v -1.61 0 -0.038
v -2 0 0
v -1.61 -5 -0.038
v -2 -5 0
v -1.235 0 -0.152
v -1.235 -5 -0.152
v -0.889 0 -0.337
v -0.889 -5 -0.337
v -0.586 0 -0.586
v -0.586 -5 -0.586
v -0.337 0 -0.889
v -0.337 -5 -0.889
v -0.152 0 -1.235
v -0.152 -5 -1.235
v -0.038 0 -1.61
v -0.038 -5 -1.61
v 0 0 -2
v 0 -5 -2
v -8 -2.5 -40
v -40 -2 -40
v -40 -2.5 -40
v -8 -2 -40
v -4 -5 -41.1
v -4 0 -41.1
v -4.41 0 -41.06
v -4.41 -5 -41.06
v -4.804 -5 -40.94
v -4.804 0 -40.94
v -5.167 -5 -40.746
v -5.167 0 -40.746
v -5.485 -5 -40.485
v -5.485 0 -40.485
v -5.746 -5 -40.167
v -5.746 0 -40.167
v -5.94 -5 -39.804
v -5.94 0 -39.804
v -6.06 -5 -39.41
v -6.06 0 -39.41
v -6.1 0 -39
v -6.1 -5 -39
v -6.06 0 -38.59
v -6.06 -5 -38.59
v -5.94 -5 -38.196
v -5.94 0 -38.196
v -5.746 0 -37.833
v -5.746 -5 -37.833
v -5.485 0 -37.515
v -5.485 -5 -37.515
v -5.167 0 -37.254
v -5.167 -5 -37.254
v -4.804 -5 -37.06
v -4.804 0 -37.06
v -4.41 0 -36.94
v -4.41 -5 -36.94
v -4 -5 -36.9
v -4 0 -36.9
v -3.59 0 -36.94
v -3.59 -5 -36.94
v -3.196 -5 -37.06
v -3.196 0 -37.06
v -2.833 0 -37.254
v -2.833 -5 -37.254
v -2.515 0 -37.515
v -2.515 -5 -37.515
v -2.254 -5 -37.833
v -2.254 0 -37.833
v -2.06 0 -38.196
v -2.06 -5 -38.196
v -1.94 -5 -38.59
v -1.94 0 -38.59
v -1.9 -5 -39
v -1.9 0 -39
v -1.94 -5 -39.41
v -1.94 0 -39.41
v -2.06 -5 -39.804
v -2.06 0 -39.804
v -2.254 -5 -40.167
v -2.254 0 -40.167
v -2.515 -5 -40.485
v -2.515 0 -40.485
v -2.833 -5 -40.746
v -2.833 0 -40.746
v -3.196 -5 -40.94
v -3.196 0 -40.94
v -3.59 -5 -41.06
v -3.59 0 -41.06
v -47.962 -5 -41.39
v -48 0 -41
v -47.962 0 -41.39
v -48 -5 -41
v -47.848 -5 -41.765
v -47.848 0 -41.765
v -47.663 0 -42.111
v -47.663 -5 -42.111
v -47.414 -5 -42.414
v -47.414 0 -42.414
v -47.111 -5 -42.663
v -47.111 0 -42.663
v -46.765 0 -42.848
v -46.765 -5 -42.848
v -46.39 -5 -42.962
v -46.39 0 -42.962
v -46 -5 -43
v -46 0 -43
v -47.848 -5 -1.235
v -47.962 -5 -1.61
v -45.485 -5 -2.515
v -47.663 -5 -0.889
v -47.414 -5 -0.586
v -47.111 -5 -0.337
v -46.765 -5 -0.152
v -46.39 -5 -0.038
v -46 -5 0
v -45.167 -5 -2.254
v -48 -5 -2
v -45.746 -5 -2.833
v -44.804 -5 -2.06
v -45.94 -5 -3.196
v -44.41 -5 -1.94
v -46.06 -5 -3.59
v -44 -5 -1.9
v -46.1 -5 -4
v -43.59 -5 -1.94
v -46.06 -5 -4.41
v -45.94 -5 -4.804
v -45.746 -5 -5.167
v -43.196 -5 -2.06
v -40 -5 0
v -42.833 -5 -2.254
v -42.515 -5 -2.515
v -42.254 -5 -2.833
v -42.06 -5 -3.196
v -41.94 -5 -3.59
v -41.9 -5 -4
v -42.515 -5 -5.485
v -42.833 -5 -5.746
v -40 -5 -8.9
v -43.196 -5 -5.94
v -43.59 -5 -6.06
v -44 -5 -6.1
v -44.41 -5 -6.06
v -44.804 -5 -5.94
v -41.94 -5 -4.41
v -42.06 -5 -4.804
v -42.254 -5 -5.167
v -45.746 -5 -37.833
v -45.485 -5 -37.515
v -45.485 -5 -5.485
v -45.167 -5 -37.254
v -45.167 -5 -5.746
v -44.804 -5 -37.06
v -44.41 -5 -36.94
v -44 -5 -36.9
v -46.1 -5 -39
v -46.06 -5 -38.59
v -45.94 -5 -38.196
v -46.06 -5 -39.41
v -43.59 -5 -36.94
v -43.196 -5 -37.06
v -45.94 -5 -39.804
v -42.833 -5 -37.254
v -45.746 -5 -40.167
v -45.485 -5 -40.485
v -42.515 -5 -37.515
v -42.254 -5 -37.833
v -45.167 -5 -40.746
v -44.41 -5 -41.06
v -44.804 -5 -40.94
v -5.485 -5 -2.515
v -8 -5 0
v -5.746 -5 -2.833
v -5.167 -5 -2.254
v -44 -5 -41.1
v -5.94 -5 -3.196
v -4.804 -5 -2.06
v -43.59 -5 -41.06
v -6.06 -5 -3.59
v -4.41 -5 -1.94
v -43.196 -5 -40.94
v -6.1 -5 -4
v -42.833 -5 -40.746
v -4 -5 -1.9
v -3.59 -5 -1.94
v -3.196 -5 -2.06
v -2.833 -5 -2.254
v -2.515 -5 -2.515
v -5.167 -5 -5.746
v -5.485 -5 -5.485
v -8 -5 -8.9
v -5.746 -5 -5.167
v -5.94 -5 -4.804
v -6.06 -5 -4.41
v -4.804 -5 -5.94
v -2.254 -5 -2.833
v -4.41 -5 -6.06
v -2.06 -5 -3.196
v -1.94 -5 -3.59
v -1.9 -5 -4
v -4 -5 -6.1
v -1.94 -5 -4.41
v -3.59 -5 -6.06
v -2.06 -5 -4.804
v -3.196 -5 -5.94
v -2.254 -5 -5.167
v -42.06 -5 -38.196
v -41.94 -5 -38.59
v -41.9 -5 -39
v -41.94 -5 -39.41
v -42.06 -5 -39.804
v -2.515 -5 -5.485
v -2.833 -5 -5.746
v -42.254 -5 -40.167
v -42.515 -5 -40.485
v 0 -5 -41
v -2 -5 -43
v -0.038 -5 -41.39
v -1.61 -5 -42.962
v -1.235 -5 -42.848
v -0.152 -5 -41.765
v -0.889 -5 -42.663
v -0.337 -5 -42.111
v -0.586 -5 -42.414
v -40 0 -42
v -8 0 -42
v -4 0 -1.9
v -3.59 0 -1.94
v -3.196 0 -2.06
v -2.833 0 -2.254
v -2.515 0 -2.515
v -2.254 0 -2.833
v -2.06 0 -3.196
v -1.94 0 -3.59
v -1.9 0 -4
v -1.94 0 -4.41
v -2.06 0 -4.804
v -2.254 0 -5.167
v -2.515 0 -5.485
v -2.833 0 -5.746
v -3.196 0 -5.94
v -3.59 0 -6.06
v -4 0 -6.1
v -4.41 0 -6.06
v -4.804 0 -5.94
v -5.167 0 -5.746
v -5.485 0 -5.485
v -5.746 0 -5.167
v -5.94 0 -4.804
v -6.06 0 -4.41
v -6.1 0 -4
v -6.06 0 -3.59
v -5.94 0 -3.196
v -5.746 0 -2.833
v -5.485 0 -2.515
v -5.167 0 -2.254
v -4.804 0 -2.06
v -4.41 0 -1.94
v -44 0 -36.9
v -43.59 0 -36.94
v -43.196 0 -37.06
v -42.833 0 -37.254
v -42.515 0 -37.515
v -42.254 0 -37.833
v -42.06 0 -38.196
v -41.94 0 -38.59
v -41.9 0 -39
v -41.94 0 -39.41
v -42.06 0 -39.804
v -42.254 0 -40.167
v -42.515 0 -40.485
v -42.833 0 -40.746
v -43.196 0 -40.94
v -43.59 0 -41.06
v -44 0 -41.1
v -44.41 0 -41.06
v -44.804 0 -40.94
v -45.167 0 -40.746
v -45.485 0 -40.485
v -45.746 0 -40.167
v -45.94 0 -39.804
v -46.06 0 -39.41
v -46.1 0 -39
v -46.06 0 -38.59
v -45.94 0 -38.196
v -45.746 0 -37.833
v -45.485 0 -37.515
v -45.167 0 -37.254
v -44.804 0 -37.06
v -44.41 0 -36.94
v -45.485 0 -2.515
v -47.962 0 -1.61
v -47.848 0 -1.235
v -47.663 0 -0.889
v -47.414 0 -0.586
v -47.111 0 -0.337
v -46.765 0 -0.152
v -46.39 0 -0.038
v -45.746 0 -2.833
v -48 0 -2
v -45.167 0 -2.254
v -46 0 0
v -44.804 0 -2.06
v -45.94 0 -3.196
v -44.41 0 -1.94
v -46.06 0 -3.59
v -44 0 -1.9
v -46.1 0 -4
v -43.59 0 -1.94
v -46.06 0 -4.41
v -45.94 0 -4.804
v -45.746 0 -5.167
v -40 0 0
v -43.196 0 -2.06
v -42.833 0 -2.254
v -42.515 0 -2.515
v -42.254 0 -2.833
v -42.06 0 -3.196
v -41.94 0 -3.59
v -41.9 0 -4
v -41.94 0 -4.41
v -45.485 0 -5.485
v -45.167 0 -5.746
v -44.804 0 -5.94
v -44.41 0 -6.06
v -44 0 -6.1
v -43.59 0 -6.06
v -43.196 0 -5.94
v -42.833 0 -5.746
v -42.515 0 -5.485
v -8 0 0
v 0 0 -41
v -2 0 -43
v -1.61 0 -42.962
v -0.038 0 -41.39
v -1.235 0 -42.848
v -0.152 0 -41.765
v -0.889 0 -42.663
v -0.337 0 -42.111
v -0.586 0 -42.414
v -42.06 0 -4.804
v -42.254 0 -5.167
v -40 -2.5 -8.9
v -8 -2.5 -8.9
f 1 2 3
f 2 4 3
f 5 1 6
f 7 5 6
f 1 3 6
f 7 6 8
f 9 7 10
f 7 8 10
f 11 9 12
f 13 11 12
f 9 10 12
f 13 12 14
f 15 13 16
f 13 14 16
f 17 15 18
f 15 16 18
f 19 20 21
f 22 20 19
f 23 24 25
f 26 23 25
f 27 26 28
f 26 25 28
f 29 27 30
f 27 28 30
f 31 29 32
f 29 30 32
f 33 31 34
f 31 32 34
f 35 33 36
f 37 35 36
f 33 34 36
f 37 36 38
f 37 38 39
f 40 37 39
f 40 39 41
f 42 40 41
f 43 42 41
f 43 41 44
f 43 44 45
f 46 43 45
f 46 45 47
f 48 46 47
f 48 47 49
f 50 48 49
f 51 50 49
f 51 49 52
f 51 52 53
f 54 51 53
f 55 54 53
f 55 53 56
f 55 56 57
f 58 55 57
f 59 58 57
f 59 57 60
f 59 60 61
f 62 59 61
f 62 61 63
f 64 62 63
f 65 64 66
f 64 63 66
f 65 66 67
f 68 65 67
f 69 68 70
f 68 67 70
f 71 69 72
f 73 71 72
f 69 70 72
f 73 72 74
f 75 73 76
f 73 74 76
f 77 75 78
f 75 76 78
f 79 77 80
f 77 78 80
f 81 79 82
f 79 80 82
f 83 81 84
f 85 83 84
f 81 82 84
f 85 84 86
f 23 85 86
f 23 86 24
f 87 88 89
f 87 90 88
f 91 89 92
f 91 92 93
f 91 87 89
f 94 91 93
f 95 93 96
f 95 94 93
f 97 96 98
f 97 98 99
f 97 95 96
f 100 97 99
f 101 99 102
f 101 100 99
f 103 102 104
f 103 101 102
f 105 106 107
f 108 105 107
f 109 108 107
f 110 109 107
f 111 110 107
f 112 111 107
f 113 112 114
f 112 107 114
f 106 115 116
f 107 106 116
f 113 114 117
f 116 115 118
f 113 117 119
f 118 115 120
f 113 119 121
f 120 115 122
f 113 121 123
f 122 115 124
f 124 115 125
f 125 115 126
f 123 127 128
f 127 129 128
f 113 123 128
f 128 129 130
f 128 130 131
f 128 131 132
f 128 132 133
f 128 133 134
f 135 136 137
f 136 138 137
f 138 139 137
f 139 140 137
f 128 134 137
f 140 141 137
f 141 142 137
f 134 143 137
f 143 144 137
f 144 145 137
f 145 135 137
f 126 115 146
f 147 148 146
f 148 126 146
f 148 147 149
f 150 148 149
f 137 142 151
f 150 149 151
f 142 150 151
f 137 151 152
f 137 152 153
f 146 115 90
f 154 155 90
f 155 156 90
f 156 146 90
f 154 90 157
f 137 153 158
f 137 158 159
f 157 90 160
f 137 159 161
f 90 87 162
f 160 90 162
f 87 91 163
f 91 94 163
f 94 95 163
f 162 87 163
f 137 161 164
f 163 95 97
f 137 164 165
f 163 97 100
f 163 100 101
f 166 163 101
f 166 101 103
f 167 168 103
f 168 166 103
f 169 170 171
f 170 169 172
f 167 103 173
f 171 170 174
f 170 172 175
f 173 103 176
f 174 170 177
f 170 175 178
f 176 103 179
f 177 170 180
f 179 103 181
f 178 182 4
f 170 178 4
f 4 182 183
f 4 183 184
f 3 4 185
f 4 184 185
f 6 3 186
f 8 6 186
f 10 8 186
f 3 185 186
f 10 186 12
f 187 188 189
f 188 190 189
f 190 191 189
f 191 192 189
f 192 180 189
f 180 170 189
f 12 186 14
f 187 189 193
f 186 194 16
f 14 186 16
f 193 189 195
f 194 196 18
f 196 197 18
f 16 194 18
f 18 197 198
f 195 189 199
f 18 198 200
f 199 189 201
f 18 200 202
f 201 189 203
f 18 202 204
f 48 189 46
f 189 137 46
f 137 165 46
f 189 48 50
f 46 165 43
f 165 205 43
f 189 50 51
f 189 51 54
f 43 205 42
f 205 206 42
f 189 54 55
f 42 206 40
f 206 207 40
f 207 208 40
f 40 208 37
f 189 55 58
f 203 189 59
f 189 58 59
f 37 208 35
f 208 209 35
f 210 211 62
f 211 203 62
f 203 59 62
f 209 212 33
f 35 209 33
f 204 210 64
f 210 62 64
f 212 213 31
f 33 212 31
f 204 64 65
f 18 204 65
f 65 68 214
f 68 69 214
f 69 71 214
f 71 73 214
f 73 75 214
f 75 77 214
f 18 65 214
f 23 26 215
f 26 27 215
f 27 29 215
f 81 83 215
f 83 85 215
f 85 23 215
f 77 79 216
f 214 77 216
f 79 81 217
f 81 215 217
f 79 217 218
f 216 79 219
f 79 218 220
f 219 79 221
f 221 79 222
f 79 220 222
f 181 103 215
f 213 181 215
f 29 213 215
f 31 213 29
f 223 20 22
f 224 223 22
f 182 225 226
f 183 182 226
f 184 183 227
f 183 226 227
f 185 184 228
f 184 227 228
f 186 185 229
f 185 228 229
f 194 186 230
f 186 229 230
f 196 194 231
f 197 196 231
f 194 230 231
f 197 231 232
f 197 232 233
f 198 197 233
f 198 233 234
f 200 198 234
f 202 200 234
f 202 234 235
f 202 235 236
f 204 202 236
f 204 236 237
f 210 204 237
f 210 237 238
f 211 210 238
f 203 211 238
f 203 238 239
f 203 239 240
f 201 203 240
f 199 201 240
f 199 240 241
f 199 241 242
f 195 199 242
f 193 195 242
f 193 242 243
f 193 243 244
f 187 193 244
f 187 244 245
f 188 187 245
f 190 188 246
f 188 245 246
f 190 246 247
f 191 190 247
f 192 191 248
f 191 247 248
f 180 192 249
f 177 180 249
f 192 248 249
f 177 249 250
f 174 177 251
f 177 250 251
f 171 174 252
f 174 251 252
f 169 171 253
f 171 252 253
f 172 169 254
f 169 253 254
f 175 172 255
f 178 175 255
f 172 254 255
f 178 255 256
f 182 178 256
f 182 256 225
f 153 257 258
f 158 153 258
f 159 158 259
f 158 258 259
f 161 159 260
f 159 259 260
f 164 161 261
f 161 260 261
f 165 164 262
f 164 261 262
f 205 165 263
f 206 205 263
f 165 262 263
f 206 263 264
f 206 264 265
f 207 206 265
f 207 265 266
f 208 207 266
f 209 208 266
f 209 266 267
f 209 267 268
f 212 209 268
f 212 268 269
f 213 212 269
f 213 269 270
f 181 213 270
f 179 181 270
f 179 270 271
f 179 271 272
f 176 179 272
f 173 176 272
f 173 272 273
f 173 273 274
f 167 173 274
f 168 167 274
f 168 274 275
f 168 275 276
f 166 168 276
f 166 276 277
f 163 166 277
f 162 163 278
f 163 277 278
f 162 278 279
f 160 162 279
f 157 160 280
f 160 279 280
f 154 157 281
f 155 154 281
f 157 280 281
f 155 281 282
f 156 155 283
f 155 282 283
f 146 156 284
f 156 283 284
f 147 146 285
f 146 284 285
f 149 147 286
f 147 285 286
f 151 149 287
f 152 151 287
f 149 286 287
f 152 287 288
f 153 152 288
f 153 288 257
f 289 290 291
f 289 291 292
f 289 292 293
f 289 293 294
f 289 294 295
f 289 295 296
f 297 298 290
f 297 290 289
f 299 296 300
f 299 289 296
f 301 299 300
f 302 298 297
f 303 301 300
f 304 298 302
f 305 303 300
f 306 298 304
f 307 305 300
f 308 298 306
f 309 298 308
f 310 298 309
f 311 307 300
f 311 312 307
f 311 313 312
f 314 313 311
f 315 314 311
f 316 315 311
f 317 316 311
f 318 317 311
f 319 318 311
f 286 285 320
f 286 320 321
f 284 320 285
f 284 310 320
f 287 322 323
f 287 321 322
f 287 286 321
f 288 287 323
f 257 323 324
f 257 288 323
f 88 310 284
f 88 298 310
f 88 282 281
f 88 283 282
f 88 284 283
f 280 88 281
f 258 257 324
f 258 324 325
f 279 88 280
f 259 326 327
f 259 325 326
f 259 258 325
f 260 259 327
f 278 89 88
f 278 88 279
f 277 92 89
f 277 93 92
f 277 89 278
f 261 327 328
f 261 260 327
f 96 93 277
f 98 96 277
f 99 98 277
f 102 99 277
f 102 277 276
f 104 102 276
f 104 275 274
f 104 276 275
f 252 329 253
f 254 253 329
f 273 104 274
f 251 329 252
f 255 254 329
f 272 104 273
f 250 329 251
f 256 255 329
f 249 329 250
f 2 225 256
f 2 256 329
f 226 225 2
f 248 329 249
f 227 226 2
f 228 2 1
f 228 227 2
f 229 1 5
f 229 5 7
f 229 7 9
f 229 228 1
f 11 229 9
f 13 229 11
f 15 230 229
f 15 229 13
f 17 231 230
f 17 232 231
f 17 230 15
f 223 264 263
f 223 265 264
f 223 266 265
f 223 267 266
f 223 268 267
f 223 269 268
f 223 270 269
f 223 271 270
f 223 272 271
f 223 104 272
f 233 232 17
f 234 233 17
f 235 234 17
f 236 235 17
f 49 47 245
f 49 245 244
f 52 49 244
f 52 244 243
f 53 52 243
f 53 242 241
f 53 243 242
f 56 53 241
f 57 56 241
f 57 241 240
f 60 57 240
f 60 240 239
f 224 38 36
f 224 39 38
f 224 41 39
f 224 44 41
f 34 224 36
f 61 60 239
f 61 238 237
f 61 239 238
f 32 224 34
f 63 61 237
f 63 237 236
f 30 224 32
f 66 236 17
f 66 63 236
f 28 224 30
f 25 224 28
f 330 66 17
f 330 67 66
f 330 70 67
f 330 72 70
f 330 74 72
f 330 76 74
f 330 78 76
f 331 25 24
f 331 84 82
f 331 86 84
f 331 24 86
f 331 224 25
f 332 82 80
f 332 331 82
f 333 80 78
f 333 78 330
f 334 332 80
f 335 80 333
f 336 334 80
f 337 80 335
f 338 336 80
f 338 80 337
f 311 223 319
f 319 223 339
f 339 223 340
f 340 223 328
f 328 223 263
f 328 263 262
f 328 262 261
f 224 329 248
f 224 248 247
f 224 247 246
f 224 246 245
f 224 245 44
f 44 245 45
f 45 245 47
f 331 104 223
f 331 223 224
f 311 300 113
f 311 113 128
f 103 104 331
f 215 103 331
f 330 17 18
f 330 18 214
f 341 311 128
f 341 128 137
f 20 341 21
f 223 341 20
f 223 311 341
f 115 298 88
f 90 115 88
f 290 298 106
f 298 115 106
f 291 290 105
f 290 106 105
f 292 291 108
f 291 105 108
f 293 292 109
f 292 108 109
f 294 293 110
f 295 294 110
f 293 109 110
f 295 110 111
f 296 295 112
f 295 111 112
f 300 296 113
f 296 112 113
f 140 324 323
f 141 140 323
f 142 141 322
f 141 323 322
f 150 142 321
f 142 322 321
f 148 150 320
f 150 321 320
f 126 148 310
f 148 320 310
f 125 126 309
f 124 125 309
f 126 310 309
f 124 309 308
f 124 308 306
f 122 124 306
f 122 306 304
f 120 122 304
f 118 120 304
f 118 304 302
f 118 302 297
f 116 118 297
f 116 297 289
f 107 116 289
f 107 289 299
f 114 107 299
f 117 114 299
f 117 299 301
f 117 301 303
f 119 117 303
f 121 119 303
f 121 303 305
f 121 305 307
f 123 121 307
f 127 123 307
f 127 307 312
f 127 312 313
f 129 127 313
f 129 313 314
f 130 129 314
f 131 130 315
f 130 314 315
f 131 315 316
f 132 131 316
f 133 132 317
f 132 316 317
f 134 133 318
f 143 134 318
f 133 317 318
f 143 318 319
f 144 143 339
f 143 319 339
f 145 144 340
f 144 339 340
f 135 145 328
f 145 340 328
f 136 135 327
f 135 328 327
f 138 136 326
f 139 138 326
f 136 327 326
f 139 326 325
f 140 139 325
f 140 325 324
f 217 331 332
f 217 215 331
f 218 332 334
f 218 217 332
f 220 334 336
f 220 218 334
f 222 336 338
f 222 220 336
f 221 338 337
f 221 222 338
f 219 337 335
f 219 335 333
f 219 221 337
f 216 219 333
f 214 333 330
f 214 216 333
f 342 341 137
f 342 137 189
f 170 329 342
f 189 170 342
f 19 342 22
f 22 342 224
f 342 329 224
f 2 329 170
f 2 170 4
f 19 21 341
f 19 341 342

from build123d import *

# Parameters (mm, degrees)
SKETCH_1_W          = 48
SKETCH_1_H          = 43
EXTRUDE_1_DEPTH     = 5
SKETCH_2_W          = 32
SKETCH_2_H          = 40
CUT_EXTRUDE_1_DEPTH = 2.5
SKETCH_3_R          = 2.1
CUT_EXTRUDE_2_DEPTH = 65.637450445
FILLET_1_R          = 2
CHAMFER_2_SIZE      = 2
SKETCH_4_W          = 32
SKETCH_4_H          = 8.9
CUT_EXTRUDE_3_DEPTH = 65.492247596


with BuildPart() as part:
    # Эскиз1 → Бобышка-Вытянуть1 (new body)
    with BuildSketch(Plane(origin=(0, 0, 0), x_dir=(1, 0, 0), z_dir=(0, 1, 0))):
        with Locations((-24, 21.5)):
            Rectangle(SKETCH_1_W, SKETCH_1_H)
    extrude(amount=-EXTRUDE_1_DEPTH)

    # Эскиз2 → Вырез-Вытянуть1 (cut)
    with BuildSketch(Plane(origin=(0, 0, 0), x_dir=(1, 0, 0), z_dir=(0, 1, 0))):
        with Locations((-24, 20)):
            Rectangle(SKETCH_2_W, SKETCH_2_H)
    extrude(amount=-CUT_EXTRUDE_1_DEPTH, mode=Mode.SUBTRACT)

    # Эскиз3 → Вырез-Вытянуть2 (cut, through all)
    with BuildSketch(Plane(origin=(0, 0, 0), x_dir=(1, 0, 0), z_dir=(0, 1, 0))):
        with Locations(Location((-44, 39, 0), (0, 0, 270))):
            Circle(SKETCH_3_R)
        with Locations(Location((-4, 39, 0), (0, 0, 90))):
            Circle(SKETCH_3_R)
        with Locations(Location((-4, 4, 0), (0, 0, 270))):
            Circle(SKETCH_3_R)
        with Locations(Location((-44, 4, 0), (0, 0, 90))):
            Circle(SKETCH_3_R)
    extrude(amount=-CUT_EXTRUDE_2_DEPTH, mode=Mode.SUBTRACT)

    # Скругление1
    fillet_1_edges = [part.edges().sort_by_distance(p)[0] for p in [
        (-48, -2.5, -43),
        (0, -2.5, -43),
        (0, -2.5, 0),
        (-48, -2.5, 0),
    ]]
    fillet(fillet_1_edges, radius=FILLET_1_R)

    # Фаска2
    chamfer_2_edges = [part.edges().sort_by_distance(p)[0] for p in [
        (-24, 0, -40),
    ]]
    chamfer(chamfer_2_edges, length=CHAMFER_2_SIZE)

    # Эскиз4 → Вырез-Вытянуть3 (cut, through all)
    with BuildSketch(Plane(origin=(0, -2.5, 0), x_dir=(1, 0, 0), z_dir=(0, 1, 0))):
        with Locations((-24, 4.45)):
            Rectangle(SKETCH_4_W, SKETCH_4_H)
    extrude(amount=-CUT_EXTRUDE_3_DEPTH, mode=Mode.SUBTRACT)


solid = part.part
